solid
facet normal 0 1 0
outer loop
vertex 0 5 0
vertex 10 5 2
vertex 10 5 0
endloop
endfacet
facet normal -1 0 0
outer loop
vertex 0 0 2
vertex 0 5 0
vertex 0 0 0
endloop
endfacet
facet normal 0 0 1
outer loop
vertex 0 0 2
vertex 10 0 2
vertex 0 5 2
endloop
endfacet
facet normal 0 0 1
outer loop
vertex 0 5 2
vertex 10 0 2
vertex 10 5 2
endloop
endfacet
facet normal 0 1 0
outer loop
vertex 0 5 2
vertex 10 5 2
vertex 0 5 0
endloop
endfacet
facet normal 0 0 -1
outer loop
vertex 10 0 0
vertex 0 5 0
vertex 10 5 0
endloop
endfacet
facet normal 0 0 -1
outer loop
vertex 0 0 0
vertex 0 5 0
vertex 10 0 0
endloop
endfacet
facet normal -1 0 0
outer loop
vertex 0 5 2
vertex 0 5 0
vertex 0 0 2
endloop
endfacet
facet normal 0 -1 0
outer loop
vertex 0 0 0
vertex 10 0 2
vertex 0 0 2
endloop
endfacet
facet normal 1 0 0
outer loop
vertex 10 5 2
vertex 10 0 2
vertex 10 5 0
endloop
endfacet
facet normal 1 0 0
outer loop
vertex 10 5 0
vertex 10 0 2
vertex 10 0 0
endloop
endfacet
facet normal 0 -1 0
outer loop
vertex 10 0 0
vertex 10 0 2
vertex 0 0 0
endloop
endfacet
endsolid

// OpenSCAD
$fn=7;
hull()
{
	translate([0,0,0])
	{
		rotate(0,[0,0,1])
		{
			cube([2,2,2]);
		}
	}
	translate([0,3,0])
	{
		rotate(0,[0,0,1])
		{
			cube([2,2,2]);
		}
	}
	translate([8,3,0])
	{
		rotate(0,[0,0,1])
		{
			cube([2,2,2]);
		}
	}
	translate([8,0,0])
	{
		rotate(0,[0,0,1])
		{
			cube([2,2,2]);
		}
	}
}
